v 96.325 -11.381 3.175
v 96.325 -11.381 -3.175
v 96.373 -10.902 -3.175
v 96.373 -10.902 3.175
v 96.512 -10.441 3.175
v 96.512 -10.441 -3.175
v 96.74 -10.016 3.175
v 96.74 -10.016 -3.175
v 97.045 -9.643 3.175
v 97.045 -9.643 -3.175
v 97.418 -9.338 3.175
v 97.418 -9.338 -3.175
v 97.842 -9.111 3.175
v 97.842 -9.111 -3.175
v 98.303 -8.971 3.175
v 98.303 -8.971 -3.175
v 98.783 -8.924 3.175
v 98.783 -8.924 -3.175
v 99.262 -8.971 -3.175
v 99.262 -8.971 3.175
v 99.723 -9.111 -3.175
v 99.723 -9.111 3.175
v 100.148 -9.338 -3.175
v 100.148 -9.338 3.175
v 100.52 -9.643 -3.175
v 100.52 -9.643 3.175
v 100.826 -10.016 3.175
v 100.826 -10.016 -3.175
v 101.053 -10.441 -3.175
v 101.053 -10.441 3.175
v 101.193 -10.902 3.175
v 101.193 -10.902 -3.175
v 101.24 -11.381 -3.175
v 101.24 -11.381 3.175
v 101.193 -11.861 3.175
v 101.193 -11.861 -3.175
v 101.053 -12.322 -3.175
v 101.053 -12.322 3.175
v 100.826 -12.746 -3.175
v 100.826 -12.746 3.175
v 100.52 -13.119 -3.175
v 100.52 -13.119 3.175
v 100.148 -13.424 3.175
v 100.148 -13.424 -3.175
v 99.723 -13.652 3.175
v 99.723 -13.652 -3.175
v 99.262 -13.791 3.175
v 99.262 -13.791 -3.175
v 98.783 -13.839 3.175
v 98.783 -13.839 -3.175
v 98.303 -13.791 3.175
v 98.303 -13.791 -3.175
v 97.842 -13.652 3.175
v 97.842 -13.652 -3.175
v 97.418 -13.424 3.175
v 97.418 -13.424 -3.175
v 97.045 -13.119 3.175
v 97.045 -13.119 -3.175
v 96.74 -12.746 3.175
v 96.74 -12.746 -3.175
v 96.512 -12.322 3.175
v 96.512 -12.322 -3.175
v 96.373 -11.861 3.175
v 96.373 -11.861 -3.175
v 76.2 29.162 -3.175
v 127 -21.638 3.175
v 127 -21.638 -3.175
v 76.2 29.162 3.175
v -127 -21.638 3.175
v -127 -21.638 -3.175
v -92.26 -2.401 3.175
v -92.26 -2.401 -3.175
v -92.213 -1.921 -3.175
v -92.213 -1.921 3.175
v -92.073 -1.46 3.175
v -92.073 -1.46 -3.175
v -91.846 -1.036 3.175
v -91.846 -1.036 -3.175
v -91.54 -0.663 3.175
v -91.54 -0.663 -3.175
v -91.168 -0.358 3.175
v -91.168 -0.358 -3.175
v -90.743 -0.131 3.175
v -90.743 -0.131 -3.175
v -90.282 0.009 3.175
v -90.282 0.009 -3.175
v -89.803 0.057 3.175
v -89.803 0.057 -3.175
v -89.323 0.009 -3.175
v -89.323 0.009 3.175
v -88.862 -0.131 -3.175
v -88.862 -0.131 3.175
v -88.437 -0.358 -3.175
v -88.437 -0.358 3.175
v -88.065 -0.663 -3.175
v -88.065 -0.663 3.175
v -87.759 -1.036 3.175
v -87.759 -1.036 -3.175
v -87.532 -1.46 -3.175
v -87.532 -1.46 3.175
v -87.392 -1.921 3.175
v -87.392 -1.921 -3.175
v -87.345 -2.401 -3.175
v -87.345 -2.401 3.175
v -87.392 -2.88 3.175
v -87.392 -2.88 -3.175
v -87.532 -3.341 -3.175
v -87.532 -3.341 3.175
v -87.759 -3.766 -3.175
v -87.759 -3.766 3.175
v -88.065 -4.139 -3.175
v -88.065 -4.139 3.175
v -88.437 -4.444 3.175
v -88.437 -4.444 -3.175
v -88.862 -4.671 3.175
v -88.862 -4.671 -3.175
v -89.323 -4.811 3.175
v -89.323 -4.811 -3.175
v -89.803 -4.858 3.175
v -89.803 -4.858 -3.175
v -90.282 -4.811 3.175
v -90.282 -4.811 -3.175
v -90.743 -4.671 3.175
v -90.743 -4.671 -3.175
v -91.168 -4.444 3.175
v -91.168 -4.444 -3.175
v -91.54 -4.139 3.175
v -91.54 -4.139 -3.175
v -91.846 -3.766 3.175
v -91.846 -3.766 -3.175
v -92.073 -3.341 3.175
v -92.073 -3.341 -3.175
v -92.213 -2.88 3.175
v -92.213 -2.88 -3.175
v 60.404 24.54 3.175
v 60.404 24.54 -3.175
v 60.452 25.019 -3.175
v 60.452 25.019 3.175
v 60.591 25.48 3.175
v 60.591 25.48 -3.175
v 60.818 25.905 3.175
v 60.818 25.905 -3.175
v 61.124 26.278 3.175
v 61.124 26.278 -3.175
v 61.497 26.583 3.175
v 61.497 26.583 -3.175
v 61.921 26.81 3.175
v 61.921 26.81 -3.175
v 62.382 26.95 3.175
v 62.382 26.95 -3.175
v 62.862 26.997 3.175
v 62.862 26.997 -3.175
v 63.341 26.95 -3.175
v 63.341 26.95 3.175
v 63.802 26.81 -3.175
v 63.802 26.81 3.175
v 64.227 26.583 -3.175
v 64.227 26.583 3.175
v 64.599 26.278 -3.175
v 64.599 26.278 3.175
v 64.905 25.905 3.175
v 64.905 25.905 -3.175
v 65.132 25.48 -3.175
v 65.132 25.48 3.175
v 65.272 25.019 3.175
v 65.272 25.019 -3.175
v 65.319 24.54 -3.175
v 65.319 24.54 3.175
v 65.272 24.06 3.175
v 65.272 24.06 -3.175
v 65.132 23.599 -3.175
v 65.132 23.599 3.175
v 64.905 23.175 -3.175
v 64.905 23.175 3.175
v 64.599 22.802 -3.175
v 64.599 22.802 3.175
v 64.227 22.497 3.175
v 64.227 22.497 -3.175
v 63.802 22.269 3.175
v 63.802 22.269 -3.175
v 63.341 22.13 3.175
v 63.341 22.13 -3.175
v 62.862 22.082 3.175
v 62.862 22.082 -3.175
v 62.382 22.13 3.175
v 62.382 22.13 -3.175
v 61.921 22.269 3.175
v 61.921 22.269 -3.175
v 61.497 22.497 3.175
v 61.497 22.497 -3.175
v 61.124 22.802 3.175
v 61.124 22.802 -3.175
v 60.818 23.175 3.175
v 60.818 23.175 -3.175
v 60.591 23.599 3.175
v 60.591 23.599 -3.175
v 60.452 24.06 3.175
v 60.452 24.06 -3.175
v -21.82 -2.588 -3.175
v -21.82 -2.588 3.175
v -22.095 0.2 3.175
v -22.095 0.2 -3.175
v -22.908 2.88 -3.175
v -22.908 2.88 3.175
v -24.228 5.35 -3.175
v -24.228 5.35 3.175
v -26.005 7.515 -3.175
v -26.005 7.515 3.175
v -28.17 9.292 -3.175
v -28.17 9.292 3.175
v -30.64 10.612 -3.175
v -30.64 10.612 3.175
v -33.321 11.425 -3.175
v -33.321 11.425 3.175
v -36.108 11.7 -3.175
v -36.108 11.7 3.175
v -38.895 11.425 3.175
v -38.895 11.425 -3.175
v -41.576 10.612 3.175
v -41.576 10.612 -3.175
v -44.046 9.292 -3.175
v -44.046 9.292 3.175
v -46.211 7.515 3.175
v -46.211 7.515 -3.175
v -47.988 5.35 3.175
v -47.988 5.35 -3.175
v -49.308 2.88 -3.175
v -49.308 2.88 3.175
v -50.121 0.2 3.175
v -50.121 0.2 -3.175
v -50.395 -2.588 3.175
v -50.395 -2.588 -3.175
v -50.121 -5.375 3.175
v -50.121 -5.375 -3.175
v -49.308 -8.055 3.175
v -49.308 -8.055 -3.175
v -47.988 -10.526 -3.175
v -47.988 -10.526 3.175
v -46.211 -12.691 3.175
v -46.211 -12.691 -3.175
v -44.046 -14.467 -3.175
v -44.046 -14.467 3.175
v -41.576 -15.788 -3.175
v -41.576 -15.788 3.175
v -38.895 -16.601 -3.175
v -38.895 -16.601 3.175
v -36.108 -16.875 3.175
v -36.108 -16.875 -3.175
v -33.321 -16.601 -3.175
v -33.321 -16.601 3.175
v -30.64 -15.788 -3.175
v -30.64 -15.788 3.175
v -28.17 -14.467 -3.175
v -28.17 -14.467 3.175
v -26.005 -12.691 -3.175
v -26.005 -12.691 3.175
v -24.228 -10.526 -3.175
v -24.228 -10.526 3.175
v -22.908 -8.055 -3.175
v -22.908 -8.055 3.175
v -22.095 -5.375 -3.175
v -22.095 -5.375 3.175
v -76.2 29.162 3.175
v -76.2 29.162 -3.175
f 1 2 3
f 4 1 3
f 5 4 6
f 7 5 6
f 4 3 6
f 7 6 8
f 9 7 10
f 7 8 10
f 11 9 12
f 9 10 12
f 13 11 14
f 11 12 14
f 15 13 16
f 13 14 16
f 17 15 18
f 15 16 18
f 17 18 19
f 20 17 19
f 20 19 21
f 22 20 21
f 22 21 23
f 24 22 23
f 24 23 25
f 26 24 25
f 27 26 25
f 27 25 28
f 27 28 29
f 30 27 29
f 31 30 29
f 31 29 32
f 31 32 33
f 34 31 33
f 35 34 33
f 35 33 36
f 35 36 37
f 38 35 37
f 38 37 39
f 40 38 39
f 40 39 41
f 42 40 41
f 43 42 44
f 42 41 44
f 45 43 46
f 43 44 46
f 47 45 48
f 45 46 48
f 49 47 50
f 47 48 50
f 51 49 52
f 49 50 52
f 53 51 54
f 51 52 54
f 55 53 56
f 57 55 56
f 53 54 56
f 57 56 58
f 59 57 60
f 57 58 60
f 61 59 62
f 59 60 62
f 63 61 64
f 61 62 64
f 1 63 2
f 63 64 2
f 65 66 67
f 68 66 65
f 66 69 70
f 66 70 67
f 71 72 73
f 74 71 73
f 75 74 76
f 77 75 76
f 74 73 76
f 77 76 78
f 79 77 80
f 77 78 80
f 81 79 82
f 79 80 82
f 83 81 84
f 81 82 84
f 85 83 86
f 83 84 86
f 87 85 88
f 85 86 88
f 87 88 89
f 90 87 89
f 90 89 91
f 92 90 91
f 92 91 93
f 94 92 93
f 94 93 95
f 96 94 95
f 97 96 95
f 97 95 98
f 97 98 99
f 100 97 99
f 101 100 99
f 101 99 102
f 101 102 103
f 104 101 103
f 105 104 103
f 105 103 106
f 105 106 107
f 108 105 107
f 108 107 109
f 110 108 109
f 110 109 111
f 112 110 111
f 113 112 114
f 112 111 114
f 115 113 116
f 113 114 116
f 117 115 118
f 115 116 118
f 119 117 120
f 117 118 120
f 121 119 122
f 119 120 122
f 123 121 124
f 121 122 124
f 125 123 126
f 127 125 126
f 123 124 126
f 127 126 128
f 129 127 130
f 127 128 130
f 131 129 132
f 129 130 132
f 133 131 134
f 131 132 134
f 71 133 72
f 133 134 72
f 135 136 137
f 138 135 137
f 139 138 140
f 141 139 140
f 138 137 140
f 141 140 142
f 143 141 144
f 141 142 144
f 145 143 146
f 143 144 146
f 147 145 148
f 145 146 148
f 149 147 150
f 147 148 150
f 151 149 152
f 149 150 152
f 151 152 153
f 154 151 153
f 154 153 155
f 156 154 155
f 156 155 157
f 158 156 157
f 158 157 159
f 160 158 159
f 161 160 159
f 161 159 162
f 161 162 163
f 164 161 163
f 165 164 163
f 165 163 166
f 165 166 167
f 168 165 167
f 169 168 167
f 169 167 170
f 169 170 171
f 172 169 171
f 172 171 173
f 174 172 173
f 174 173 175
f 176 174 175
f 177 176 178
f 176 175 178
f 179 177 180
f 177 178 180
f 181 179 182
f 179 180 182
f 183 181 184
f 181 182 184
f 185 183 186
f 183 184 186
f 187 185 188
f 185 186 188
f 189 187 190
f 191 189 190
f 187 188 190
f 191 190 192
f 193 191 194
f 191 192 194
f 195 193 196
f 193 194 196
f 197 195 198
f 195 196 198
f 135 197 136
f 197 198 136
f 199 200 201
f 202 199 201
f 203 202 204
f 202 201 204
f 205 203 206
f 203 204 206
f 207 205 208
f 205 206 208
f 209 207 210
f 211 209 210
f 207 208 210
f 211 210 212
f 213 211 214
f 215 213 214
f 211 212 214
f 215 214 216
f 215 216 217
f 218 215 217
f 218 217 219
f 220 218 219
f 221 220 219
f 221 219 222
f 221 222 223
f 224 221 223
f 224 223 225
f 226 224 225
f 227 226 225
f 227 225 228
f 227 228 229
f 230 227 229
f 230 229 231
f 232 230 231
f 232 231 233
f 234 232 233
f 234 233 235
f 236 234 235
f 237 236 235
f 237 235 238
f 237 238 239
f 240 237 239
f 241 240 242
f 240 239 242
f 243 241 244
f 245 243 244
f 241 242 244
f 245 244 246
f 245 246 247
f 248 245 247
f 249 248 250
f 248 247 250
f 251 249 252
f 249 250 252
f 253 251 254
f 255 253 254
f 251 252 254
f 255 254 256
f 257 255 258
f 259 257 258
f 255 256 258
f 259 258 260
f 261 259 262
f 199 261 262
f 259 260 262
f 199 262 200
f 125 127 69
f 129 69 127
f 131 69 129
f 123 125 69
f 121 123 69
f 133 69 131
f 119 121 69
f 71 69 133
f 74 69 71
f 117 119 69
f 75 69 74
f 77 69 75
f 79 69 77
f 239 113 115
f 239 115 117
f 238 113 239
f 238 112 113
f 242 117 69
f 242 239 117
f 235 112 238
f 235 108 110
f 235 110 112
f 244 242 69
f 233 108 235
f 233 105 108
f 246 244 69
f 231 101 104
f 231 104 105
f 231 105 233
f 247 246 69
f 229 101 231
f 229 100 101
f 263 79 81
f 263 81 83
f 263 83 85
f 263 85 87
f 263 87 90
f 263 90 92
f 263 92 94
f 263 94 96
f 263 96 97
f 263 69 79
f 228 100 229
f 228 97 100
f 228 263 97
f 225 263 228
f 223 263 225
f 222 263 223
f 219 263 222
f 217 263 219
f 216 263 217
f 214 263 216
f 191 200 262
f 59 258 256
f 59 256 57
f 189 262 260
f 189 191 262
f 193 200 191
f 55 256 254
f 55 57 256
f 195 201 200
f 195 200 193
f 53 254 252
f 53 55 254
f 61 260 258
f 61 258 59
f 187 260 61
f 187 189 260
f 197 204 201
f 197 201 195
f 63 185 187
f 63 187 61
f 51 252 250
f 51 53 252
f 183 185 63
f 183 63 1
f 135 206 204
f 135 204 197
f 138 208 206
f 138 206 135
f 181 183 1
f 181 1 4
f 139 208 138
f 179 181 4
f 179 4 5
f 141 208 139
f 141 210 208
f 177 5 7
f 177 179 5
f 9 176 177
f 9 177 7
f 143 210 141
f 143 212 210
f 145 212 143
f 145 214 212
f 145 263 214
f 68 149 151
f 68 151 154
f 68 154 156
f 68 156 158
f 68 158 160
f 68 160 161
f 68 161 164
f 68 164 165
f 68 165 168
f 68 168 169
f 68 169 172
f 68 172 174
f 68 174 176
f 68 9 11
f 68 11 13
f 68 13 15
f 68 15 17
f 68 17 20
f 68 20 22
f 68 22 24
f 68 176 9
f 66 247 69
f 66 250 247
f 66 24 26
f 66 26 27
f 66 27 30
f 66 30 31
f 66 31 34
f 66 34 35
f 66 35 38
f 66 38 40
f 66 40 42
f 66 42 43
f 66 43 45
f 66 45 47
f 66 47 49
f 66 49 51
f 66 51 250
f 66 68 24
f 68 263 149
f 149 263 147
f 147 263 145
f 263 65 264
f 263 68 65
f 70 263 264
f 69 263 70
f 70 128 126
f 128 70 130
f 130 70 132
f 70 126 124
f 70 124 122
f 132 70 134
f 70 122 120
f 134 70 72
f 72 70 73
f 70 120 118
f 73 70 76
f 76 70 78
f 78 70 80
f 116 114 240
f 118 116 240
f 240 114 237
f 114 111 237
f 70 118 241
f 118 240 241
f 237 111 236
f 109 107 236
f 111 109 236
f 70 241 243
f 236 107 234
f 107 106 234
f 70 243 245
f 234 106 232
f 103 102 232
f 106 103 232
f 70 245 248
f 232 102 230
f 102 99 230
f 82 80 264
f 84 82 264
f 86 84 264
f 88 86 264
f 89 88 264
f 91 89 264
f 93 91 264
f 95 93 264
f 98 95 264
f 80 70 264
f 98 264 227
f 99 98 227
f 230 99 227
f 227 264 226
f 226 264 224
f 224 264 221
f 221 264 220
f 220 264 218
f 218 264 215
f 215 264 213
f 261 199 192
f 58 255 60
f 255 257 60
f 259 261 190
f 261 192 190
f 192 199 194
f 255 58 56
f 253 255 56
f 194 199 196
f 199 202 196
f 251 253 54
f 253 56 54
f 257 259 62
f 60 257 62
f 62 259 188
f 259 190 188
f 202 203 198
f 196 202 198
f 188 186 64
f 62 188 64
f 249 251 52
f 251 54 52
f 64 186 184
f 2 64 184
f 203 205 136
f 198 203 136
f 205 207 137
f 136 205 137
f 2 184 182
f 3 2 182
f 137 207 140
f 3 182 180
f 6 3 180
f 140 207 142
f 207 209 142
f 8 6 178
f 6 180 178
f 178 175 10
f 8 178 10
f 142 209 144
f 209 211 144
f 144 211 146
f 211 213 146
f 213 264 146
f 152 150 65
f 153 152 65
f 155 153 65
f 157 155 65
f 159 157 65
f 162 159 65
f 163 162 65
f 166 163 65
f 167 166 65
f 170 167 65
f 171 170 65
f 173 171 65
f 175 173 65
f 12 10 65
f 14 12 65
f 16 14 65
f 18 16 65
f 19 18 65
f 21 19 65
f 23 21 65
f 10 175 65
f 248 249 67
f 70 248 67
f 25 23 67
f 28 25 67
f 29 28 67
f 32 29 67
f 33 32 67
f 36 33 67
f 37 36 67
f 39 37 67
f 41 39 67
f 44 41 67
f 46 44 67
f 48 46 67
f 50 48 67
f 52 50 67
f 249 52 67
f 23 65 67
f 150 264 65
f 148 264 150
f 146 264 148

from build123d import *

# Parameters (mm, degrees)
BOSS_EXTRUDE1_DEPTH          = 3.175
SKETCH2_R                    = 14.2875
CUT_EXTRUDE1_DEPTH           = 131.459778054
F_10_0_1935_DIAMETER_HOLE2_D = 4.9149


with BuildPart() as part:
    # Sketch1 → Boss-Extrude1 (new, symmetric)
    with BuildSketch(Plane.XY):
        Polygon((-76.2, 29.162153383), (-127, -21.637846617), (127, -21.637846617), (76.2, 29.162153383), align=None)
    extrude(amount=BOSS_EXTRUDE1_DEPTH, both=True)

    # Sketch2 → Cut-Extrude1 (cut, through all)
    with BuildSketch(Plane.XY.offset(3.175)):
        with Locations((-36.107951031, -2.587846617)):
            Circle(SKETCH2_R)
    extrude(amount=-CUT_EXTRUDE1_DEPTH, mode=Mode.SUBTRACT)

    # #10 (0.1935) Diameter Hole2 (through all)
    with Locations(Plane(origin=(62.861792847, 24.539848294, 3.175), x_dir=(1, 0, 0), z_dir=(0, 0, 1))):
        with Locations((0, 0), (35.921024485, -35.921024485), (-152.664354058, -26.940768364)):
            Hole(F_10_0_1935_DIAMETER_HOLE2_D / 2)


solid = part.part
